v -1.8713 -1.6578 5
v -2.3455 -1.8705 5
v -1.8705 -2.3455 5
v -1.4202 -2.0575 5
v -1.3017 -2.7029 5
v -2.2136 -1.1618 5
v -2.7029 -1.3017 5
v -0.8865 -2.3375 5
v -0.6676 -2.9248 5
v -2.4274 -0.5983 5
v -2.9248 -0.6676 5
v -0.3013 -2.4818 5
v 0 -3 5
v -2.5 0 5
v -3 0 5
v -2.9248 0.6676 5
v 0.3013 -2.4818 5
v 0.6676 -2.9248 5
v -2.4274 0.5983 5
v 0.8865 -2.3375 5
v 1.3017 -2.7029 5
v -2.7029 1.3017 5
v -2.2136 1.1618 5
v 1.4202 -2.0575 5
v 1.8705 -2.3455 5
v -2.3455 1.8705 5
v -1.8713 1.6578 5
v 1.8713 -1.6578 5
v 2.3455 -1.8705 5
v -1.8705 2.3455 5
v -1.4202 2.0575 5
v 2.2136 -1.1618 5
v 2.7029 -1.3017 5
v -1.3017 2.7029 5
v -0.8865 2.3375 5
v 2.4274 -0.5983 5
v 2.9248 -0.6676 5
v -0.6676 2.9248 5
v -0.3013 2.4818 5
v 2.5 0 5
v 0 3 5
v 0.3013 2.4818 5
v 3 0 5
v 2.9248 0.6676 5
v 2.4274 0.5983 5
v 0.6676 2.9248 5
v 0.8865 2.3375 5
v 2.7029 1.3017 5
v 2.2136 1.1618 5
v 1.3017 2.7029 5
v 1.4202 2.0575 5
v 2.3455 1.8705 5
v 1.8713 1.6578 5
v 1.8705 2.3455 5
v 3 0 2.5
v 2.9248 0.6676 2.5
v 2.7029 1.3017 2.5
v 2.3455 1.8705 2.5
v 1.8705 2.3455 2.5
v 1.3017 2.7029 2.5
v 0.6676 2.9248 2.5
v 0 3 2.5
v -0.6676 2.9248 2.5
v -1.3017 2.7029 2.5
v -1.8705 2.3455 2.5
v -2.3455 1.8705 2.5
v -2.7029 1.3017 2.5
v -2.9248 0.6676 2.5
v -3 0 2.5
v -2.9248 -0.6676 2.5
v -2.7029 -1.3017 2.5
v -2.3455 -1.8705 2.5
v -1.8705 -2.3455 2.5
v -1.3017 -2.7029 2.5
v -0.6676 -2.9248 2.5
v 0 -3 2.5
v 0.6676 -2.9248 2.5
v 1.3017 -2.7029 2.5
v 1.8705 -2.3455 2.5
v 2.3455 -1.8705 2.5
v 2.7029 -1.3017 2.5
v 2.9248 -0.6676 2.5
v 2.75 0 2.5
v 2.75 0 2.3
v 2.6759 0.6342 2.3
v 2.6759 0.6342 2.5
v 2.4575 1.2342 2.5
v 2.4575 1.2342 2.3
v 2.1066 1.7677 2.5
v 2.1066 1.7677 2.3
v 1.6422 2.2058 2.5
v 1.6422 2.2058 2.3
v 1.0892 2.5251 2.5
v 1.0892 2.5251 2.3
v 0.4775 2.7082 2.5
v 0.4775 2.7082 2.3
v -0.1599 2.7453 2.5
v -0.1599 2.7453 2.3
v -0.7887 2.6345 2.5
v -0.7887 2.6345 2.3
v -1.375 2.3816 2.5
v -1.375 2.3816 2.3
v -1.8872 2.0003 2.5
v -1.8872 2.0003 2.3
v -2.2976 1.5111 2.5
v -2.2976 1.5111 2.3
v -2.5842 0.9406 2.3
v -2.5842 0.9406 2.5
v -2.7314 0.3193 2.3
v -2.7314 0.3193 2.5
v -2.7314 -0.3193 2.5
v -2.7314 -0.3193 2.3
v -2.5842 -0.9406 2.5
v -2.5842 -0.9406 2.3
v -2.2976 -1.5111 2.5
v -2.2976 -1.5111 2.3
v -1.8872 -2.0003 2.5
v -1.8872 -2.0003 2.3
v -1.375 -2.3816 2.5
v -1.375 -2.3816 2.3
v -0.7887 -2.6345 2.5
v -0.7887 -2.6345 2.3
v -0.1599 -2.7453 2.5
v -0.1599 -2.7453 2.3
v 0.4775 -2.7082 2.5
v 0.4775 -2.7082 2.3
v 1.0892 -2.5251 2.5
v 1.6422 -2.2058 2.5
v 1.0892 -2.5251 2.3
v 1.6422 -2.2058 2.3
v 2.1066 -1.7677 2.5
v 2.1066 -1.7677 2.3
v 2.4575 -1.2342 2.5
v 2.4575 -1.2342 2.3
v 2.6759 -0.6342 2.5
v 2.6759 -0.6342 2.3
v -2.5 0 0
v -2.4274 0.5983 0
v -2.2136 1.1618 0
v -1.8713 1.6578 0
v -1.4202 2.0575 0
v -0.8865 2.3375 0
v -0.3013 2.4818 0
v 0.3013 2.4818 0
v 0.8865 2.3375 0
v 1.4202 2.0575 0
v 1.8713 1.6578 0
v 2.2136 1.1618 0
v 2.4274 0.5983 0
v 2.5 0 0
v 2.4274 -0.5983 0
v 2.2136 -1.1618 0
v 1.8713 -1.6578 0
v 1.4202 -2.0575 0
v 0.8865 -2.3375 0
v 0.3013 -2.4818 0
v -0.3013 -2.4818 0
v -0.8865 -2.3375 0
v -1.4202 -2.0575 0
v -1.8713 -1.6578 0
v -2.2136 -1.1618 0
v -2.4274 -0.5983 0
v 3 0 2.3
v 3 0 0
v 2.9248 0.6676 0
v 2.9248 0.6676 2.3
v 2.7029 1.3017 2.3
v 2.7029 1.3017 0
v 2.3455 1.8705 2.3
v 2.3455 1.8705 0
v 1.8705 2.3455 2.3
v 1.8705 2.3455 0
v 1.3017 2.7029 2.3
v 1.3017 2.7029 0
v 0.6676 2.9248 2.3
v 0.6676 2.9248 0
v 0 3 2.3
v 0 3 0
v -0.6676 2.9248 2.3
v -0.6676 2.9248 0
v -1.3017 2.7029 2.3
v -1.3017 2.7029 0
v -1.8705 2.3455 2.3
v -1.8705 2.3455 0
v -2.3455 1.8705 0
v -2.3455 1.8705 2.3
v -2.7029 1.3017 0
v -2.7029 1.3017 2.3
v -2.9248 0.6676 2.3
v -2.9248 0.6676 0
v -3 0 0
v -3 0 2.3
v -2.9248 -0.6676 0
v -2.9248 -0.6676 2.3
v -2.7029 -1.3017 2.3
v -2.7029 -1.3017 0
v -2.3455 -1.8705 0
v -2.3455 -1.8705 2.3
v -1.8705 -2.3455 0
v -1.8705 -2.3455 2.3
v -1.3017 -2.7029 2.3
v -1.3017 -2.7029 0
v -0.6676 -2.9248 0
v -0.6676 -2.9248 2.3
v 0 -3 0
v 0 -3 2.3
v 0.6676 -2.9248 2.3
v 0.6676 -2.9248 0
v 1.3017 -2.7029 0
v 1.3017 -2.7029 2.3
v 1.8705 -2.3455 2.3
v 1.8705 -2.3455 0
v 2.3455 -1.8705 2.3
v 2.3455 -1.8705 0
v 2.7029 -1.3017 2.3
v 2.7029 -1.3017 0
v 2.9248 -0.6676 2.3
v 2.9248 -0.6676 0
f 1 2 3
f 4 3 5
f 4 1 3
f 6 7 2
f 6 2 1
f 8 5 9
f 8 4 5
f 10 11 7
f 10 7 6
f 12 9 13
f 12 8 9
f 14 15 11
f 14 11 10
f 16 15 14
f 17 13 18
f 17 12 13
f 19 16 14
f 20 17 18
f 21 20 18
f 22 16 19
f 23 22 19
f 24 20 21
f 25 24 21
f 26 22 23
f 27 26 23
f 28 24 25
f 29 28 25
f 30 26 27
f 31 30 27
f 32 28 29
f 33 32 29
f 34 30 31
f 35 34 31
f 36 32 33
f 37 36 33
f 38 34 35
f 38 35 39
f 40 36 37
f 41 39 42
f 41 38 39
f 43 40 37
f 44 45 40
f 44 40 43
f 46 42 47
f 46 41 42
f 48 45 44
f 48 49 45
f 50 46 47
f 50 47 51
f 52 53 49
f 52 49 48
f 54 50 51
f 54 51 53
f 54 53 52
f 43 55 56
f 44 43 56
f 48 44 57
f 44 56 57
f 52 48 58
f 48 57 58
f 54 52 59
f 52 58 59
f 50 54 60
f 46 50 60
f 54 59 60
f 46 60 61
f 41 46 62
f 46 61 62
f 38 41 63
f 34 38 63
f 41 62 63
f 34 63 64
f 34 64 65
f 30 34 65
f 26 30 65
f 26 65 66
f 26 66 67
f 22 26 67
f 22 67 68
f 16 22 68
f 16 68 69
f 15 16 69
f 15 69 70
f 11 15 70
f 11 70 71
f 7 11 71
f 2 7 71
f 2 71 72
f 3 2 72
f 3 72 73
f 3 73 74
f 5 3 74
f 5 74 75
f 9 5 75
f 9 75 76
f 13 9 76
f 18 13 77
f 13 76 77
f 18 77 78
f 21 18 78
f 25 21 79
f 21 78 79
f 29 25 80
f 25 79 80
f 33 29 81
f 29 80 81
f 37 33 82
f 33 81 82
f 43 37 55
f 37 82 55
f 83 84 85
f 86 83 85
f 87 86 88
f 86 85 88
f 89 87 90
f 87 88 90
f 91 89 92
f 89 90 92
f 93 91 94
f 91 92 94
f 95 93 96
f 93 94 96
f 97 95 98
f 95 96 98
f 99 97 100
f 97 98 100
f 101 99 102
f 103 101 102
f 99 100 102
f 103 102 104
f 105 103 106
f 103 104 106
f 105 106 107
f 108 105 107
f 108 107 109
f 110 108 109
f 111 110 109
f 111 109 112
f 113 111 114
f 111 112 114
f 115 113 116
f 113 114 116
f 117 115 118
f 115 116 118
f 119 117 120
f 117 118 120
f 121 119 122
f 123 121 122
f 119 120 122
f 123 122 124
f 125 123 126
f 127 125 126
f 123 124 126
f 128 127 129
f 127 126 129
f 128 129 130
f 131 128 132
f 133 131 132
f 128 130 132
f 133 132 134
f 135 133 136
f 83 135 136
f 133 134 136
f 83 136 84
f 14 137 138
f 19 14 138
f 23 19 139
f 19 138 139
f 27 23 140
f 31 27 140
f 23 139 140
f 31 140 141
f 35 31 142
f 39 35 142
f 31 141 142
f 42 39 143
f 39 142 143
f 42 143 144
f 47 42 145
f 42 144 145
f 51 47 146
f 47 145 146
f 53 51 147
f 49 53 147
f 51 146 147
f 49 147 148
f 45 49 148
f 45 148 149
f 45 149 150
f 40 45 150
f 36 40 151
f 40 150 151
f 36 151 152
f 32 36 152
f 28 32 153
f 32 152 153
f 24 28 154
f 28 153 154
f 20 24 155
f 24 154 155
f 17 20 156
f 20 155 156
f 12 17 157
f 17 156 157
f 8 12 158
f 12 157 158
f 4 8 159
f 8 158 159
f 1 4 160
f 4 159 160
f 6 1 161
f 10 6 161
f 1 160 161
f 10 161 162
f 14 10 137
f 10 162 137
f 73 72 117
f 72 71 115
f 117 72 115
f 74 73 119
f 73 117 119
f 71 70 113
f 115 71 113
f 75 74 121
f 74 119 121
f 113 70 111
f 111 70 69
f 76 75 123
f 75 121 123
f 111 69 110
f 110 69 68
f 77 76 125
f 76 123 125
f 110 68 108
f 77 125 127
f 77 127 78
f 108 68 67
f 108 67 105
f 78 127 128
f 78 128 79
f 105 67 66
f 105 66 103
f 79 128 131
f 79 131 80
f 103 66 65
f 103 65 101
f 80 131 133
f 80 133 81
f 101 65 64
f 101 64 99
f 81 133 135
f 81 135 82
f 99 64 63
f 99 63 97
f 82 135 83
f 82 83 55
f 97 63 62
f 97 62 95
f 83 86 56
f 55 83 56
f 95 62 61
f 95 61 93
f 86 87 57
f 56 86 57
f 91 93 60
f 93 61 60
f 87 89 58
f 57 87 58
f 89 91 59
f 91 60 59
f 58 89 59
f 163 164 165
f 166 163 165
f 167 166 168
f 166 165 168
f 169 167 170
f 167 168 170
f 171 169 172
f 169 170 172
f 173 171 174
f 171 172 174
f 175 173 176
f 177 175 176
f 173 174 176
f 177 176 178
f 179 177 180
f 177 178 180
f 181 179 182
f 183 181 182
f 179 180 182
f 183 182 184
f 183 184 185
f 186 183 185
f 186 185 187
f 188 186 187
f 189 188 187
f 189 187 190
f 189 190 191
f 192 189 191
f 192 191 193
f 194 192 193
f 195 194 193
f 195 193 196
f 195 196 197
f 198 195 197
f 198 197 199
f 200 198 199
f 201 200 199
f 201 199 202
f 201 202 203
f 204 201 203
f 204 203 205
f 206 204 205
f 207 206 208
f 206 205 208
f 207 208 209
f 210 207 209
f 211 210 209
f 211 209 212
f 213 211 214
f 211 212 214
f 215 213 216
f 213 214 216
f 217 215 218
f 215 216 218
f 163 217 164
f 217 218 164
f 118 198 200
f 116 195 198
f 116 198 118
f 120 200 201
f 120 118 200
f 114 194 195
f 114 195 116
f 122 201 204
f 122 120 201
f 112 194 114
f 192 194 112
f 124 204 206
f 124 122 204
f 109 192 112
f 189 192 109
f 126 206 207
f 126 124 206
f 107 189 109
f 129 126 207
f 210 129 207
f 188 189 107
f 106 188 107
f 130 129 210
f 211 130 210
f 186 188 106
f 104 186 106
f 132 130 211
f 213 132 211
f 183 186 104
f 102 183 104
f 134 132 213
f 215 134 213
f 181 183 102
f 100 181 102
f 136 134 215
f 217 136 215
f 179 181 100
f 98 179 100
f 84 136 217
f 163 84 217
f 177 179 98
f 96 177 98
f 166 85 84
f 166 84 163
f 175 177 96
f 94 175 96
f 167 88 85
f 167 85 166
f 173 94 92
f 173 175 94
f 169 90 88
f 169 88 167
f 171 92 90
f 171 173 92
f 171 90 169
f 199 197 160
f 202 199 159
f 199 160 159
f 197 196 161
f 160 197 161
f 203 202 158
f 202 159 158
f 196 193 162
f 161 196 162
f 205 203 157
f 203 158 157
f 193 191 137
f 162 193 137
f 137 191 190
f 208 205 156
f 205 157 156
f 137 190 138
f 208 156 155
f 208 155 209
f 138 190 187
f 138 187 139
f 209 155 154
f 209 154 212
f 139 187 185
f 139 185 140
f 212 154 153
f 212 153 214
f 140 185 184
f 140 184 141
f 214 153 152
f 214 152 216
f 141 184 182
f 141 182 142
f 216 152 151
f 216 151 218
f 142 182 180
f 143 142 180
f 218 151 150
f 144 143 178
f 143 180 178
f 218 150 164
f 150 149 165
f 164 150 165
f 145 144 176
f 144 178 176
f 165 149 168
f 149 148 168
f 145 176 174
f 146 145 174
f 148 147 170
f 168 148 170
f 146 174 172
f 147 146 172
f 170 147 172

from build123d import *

# Parameters (mm, degrees)
SKETCH_1_R          = 3
EXTRUDE_1_DEPTH     = 5
SKETCH_2_R          = 2.5
CUT_EXTRUDE_1_DEPTH = 5
CUT_EXTRUDE_START   = -0.2
SKETCH_3_R          = 3
SKETCH_3_R_2        = 2.75
CUT_EXTRUDE_2_DEPTH = 0.2


with BuildPart() as part:
    # 草图1 → 凸台-拉伸1 (new body)
    with BuildSketch(Plane.XY):
        Circle(SKETCH_1_R)
    extrude(amount=EXTRUDE_1_DEPTH)

    # 草图2 → 切除-拉伸1 (cut)
    with BuildSketch(Plane(origin=(0, 0, 0), x_dir=(-1, 0, 0), z_dir=(0, 0, -1))):
        Circle(SKETCH_2_R)
    extrude(amount=-CUT_EXTRUDE_1_DEPTH, mode=Mode.SUBTRACT)

    # 草图3 → 切除-拉伸2 (cut)
    with BuildSketch(Plane.XY.offset(2.5).offset(CUT_EXTRUDE_START)):
        Circle(SKETCH_3_R)
        Circle(SKETCH_3_R_2, mode=Mode.SUBTRACT)
    extrude(amount=CUT_EXTRUDE_2_DEPTH, mode=Mode.SUBTRACT)


solid = part.part
